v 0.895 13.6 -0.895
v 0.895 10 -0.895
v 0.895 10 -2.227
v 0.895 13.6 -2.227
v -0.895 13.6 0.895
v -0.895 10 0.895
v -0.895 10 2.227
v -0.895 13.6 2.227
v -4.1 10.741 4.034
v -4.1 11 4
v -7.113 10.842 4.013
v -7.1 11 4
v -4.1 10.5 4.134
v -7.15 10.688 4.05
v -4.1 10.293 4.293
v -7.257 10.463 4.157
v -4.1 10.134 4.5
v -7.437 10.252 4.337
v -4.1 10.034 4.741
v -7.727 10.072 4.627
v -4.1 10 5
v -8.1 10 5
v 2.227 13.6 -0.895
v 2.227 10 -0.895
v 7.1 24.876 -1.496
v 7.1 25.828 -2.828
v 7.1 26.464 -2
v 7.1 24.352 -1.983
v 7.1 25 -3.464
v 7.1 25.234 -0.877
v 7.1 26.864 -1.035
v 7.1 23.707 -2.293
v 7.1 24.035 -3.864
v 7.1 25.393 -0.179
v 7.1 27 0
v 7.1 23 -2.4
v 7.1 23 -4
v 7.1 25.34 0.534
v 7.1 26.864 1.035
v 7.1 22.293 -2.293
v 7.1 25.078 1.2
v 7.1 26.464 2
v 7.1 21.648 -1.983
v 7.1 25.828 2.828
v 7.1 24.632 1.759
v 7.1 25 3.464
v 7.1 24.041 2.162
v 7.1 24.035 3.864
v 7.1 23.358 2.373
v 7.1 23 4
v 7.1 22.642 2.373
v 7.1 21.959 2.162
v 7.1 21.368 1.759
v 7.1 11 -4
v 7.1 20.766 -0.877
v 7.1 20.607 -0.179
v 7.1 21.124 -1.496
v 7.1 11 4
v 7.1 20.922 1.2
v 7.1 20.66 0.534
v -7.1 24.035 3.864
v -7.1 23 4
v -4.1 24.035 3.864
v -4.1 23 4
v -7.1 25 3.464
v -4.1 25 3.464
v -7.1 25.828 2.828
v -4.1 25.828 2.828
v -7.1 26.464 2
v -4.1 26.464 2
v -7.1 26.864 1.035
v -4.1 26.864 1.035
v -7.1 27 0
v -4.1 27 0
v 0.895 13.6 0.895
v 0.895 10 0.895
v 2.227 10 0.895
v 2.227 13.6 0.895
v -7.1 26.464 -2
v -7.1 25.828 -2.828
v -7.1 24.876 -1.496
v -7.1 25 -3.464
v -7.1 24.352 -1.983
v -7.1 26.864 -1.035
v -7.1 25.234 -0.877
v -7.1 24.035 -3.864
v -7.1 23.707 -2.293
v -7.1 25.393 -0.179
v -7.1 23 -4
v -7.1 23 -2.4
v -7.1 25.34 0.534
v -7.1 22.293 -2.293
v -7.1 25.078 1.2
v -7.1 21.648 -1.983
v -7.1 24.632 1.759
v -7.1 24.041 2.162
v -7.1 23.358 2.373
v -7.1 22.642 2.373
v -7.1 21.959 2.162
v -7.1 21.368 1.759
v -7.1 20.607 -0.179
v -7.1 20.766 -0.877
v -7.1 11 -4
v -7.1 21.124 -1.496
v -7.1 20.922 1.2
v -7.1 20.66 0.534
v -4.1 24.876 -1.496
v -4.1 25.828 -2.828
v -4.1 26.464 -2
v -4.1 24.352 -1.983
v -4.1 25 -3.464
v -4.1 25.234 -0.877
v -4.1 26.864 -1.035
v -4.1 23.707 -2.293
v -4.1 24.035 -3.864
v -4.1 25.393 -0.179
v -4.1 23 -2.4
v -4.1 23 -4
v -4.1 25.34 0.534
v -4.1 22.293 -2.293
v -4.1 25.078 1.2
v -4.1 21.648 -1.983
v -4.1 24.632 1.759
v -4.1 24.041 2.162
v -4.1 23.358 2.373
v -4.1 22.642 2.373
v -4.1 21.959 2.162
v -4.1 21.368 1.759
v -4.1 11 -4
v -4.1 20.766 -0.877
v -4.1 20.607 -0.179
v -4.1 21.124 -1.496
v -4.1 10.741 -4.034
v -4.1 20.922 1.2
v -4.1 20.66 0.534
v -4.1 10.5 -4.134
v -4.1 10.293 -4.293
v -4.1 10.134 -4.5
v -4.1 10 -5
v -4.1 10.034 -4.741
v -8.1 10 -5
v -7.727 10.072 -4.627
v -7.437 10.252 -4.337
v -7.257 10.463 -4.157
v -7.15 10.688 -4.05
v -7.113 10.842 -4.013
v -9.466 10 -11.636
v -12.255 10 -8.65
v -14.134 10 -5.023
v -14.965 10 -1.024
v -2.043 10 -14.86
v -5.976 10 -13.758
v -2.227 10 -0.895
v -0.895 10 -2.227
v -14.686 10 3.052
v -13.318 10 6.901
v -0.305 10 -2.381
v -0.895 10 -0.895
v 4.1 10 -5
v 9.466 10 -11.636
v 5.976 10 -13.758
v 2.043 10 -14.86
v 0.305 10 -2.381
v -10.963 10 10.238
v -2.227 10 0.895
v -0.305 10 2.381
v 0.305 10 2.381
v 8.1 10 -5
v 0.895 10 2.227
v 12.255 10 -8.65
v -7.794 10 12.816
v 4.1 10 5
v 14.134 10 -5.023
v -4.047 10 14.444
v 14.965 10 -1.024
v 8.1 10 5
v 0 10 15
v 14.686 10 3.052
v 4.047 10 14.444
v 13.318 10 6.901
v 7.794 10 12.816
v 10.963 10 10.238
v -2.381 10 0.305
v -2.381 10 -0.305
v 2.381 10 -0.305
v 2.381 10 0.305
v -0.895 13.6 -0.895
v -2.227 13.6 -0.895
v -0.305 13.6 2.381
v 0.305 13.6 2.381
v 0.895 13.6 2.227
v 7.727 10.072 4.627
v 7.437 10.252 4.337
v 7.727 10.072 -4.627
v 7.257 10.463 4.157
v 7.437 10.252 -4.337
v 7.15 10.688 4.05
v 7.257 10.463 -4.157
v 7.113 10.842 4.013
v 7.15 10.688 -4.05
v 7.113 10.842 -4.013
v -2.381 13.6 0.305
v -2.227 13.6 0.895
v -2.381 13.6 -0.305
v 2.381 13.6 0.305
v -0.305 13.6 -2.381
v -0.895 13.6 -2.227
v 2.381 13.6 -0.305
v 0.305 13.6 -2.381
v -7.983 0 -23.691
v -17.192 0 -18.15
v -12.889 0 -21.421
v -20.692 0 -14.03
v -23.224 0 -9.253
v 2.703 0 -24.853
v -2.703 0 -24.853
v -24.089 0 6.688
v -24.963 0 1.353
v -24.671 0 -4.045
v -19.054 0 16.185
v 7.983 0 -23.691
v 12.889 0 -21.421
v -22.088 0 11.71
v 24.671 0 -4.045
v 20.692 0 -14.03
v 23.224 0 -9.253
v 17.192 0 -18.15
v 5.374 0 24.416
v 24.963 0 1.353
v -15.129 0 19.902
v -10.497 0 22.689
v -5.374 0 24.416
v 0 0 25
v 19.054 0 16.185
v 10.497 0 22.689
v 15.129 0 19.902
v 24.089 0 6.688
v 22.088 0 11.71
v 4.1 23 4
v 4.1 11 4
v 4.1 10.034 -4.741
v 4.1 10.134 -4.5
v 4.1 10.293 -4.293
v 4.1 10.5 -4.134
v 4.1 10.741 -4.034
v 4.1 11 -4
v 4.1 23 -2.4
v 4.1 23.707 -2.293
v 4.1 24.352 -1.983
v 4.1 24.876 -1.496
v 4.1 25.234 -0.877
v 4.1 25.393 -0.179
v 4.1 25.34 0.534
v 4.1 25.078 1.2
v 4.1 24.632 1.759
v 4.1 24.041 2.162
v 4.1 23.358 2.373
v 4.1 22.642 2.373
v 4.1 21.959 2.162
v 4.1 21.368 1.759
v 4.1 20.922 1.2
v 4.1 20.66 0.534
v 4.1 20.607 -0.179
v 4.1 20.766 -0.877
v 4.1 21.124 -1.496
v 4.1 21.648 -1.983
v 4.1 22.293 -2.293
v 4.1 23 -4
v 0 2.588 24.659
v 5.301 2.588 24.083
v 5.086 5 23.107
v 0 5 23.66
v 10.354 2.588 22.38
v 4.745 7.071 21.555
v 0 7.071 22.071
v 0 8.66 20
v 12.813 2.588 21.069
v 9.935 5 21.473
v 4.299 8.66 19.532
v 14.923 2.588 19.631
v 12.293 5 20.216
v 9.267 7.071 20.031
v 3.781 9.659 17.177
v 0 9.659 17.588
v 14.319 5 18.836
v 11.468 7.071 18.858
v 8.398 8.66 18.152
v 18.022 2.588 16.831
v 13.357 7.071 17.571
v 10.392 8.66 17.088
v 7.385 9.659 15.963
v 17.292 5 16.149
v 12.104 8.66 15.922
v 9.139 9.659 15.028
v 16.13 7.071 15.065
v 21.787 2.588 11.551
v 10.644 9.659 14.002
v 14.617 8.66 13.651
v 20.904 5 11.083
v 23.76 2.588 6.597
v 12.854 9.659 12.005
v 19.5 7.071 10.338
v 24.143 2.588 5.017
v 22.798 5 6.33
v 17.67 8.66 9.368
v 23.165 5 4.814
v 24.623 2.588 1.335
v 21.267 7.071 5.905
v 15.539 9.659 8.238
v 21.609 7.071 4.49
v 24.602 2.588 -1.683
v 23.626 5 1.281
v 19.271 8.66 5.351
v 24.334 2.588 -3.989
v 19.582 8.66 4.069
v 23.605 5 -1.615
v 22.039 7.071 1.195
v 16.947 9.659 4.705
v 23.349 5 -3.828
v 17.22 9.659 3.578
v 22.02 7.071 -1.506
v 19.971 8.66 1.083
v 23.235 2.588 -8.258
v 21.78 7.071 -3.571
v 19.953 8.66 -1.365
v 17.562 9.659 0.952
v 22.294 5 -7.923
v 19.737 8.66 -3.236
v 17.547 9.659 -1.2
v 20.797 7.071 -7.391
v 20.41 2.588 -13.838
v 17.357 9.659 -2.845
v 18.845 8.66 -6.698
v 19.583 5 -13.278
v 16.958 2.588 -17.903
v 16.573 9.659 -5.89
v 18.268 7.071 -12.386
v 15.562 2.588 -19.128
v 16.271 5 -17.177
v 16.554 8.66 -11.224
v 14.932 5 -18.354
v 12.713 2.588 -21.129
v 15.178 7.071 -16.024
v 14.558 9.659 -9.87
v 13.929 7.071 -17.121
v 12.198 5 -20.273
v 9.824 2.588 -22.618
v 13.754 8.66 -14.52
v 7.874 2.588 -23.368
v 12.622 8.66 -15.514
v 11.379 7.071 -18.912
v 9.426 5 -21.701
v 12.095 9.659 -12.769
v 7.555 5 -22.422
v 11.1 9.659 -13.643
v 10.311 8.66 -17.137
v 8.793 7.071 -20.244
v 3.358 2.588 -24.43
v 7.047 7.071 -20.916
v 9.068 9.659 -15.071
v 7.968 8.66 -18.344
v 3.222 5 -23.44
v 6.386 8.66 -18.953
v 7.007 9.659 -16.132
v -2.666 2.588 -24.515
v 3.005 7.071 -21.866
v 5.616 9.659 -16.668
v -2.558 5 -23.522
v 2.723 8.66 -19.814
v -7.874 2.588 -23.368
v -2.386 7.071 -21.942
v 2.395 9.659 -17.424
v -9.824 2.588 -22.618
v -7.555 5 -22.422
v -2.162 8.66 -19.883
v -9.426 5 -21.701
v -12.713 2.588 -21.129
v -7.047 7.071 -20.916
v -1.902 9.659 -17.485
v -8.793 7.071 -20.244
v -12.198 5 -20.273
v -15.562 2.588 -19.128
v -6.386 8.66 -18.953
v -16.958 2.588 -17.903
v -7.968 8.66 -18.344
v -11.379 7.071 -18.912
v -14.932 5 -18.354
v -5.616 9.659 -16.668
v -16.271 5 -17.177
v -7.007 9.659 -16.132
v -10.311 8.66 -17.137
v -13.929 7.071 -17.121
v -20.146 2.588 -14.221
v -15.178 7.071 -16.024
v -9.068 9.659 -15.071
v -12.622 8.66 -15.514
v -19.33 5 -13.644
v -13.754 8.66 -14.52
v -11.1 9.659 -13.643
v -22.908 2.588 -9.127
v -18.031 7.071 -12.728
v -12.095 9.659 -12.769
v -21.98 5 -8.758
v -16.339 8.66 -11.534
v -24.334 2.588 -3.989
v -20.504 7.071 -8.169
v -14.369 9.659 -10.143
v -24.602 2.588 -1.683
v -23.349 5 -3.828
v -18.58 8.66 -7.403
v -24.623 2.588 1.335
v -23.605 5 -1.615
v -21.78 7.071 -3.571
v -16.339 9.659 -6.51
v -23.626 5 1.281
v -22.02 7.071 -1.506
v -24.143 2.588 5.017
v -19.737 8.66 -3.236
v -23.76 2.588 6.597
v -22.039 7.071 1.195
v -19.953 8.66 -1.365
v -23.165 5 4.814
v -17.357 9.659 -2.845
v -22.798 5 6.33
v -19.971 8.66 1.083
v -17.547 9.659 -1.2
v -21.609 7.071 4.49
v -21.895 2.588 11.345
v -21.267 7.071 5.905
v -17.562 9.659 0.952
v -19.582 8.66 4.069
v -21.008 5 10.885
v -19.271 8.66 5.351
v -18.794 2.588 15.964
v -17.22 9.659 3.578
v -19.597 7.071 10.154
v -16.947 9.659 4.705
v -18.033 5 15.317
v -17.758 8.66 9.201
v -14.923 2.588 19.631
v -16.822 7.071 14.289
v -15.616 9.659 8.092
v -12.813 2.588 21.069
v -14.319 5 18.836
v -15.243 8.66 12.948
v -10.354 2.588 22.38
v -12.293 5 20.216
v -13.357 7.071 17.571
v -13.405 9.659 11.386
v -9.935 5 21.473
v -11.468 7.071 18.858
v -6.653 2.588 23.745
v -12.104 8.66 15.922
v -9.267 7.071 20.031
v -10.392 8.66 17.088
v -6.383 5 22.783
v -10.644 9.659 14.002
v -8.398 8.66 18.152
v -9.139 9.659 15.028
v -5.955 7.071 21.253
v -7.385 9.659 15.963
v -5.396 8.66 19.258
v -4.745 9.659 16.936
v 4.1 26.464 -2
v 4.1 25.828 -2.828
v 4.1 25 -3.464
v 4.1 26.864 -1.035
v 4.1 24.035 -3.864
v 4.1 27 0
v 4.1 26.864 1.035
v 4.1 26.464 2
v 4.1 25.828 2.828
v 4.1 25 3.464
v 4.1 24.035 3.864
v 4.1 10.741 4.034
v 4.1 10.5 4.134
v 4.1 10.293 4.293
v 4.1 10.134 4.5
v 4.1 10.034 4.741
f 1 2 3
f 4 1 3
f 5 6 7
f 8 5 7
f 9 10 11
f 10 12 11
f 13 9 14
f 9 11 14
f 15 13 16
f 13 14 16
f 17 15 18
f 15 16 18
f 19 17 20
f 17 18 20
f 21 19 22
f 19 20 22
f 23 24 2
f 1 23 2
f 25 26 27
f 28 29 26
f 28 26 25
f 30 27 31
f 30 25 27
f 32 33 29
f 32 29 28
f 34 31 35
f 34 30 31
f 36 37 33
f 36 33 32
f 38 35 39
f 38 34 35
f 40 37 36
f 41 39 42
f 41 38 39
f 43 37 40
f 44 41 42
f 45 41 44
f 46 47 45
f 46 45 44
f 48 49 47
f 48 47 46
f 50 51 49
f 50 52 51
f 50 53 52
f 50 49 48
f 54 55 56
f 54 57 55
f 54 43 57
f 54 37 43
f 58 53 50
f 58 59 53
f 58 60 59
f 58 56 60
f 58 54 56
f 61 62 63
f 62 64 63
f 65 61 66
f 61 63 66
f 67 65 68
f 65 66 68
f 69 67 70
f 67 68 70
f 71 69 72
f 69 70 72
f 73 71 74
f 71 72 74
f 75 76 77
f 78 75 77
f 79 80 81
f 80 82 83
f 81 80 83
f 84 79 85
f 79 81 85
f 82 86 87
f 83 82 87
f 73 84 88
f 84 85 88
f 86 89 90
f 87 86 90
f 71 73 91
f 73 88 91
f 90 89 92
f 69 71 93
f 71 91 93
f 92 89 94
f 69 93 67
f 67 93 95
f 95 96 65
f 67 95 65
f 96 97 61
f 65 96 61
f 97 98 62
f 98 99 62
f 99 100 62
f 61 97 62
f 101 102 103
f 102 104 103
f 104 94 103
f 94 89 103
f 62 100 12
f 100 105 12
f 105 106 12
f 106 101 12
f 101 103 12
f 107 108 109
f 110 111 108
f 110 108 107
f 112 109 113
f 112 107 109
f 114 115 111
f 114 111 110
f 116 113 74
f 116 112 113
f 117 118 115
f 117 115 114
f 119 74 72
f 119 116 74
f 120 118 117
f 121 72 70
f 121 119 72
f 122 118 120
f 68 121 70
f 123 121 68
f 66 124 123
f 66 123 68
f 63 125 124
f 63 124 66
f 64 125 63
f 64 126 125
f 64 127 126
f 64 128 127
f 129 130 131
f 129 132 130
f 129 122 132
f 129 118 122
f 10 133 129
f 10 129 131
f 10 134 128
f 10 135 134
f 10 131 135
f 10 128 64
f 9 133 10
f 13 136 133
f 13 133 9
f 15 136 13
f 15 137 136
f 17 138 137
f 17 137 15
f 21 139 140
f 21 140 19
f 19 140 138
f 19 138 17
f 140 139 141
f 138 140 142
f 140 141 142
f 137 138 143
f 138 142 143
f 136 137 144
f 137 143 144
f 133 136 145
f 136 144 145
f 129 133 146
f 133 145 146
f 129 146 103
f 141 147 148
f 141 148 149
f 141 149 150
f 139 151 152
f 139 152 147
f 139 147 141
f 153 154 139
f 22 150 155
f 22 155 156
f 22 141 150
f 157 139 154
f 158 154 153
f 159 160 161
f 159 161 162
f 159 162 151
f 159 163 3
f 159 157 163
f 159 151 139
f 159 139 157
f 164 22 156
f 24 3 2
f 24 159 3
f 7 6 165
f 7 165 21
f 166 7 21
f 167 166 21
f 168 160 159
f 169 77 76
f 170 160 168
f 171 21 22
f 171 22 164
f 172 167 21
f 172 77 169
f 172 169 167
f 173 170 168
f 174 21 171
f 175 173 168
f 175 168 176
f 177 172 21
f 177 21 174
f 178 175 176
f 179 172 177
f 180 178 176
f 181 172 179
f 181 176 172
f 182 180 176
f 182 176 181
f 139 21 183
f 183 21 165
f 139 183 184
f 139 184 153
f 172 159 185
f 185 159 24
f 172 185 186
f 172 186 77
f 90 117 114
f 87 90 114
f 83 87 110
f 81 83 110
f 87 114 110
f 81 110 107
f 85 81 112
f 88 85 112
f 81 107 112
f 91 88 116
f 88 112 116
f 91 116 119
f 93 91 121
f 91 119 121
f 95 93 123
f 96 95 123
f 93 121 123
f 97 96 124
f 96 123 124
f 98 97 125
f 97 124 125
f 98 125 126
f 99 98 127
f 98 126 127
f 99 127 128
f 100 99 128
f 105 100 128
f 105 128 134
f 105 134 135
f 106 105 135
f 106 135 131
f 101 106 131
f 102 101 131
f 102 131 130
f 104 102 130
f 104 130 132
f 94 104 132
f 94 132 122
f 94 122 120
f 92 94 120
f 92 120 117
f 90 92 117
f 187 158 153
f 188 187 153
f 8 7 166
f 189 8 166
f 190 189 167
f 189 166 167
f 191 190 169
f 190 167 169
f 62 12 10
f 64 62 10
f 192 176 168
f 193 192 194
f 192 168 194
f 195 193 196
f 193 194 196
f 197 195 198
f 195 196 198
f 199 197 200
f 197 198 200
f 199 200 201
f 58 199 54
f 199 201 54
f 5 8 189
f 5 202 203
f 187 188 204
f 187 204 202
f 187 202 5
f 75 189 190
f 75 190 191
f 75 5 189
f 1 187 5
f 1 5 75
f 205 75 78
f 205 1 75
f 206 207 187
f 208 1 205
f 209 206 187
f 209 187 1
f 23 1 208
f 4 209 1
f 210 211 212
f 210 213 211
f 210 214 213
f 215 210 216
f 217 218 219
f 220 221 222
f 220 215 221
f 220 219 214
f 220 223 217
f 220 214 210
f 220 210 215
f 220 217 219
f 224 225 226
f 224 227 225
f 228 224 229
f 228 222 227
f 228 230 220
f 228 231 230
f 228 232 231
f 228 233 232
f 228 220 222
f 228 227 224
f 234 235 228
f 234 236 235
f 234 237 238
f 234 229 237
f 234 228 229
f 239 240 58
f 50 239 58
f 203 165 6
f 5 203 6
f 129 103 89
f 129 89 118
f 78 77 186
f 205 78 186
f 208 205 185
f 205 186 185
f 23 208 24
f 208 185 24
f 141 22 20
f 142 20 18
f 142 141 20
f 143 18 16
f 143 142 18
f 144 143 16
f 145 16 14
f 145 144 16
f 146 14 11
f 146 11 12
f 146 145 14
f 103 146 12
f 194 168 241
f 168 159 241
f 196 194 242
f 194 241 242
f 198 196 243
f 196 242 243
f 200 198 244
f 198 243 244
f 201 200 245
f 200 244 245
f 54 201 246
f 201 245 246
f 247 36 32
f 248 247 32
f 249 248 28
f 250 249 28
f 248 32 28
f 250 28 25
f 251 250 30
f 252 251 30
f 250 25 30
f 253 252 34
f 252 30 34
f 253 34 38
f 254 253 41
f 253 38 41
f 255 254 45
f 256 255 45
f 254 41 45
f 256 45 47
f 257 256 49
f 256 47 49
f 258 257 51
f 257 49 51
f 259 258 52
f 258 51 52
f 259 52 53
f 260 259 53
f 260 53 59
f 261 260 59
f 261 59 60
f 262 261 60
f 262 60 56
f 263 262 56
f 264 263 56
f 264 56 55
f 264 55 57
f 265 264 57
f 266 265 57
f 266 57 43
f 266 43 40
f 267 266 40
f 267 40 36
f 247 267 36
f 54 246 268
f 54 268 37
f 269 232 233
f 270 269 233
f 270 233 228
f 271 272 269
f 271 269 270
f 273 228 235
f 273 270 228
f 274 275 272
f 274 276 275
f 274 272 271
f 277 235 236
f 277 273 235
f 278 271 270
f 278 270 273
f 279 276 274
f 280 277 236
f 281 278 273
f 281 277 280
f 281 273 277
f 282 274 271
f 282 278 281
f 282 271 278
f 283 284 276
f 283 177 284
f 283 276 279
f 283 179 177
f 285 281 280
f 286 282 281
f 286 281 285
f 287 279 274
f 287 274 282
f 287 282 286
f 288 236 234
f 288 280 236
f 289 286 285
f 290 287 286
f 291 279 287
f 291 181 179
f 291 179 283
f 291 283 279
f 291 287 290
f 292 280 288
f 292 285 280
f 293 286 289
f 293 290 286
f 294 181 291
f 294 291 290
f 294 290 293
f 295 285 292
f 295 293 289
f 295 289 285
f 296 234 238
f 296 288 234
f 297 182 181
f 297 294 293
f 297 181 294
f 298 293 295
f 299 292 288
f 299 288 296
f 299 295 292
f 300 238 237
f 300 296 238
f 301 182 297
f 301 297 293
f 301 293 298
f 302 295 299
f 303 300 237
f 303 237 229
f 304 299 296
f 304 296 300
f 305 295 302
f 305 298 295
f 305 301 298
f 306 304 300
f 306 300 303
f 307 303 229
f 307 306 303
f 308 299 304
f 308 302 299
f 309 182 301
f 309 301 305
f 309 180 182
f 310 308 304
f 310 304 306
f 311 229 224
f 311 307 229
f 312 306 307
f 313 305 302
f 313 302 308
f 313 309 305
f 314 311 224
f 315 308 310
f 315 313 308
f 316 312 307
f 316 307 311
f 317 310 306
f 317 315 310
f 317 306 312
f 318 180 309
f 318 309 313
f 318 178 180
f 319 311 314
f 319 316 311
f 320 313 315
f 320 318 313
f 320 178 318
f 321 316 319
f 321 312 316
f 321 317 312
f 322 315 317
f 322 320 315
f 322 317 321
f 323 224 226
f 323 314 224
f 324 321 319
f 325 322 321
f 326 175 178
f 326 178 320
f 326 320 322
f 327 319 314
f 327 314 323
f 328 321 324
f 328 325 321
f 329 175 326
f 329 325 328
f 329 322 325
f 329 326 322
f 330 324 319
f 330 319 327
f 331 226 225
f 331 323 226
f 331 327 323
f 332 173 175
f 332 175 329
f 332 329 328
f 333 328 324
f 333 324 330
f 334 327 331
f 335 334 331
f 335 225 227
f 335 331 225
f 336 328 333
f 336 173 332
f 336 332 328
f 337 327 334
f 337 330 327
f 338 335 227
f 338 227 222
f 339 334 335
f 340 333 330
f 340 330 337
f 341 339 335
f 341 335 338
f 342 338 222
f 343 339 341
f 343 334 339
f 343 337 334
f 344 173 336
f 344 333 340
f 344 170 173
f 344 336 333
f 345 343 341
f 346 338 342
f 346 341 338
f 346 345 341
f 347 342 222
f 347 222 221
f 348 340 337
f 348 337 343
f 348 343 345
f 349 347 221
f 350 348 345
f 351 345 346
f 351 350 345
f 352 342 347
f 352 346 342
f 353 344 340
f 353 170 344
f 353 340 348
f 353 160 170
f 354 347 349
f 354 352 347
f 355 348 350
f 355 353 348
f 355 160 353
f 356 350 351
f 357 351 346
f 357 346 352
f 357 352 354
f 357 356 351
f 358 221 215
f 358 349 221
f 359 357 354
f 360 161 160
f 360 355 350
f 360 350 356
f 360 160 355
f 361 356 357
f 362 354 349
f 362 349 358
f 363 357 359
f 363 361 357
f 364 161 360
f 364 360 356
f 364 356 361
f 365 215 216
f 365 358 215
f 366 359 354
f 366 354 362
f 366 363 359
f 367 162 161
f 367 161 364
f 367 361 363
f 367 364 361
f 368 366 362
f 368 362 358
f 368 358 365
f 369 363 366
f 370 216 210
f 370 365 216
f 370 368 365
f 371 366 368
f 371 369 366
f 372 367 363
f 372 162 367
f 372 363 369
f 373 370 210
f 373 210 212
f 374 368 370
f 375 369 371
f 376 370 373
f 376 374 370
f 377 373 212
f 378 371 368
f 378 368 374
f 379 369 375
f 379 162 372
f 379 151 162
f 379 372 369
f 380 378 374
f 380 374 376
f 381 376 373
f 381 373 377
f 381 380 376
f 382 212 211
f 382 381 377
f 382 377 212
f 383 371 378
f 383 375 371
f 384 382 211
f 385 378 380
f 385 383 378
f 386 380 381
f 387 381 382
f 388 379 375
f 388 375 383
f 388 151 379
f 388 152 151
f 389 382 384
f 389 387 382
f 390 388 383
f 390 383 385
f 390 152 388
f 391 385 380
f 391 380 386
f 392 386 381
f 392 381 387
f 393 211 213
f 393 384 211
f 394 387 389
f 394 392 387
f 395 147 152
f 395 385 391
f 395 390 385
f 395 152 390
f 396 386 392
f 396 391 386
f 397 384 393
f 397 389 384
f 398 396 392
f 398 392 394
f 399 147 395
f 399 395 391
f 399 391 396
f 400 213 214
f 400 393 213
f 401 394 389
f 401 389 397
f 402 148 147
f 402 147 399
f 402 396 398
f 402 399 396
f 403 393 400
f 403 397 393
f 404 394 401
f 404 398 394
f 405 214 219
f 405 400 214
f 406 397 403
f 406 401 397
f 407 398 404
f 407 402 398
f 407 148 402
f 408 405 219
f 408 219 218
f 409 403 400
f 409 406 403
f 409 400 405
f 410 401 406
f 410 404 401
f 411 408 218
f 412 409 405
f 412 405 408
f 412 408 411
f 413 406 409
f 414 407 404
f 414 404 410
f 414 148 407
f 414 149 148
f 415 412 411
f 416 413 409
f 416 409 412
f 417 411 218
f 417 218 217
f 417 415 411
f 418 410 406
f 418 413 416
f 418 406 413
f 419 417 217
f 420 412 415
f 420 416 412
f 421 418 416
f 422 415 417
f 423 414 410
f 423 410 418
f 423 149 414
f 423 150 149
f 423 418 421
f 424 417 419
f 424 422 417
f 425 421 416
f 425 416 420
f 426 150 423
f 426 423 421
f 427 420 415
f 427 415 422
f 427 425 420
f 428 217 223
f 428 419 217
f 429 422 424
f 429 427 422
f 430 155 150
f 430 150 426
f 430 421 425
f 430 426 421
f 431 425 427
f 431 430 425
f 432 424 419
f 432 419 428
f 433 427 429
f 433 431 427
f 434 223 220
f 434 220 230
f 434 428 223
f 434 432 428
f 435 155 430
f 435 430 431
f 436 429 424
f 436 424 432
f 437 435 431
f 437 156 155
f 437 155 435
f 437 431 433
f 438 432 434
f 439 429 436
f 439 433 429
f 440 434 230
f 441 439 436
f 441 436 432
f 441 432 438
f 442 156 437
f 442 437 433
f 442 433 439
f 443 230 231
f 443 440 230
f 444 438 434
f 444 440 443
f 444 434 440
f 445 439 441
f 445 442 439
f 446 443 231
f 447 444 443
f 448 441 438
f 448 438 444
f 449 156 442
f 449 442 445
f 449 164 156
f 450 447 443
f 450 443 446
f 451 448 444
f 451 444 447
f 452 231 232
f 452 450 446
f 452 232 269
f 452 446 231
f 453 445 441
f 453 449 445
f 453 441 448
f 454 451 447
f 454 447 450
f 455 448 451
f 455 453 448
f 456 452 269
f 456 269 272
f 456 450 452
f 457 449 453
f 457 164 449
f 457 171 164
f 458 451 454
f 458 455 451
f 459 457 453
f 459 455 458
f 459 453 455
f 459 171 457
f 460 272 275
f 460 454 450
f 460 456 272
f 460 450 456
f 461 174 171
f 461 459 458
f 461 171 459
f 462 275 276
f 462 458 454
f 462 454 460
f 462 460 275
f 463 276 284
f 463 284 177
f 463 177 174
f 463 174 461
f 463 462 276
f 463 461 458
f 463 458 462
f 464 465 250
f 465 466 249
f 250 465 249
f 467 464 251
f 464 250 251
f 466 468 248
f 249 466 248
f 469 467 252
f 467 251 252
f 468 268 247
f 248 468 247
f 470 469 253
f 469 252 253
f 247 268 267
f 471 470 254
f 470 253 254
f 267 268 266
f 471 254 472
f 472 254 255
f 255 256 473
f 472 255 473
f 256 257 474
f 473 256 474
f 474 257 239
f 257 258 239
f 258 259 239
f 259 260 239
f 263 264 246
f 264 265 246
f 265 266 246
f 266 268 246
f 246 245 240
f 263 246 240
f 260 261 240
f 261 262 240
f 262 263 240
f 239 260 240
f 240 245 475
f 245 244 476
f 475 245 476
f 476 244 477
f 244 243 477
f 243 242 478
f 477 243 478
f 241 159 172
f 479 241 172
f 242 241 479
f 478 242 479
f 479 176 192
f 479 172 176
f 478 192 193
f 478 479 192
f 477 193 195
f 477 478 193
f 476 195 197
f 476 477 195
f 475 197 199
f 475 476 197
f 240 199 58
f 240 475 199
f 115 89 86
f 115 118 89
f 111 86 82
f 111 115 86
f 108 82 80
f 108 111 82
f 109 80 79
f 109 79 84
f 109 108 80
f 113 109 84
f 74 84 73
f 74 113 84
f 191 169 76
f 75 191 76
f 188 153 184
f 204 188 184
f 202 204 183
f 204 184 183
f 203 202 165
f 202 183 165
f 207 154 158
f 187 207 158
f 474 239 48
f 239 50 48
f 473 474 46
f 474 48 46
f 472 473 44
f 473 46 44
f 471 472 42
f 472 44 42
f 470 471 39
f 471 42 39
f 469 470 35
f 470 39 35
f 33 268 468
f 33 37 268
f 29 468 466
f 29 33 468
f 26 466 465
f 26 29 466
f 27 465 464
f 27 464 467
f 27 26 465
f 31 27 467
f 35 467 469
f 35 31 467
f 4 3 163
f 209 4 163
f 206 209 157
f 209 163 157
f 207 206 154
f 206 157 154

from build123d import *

# Parameters (mm, degrees)
SKETCH1_R           = 25
BOSS_EXTRUDE1_DEPTH = 10
FILLET1_R           = 10
BOSS_EXTRUDE2_DEPTH = 3.6
SKETCH3_W           = 3
SKETCH3_H           = 8
BOSS_EXTRUDE3_DEPTH = 27
SKETCH4_R           = 2.4
CUT_EXTRUDE1_DEPTH  = 49.830420846
FILLET2_R           = 4
FILLET3_R           = 1


with BuildPart() as part:
    # Sketch1 → Boss-Extrude1 (new body)
    with BuildSketch(Plane(origin=(0, 0, 0), x_dir=(1, 0, 0), z_dir=(0, 1, 0))):
        with Locations(Location((0, 0, 0), (0, 0, 270))):
            Circle(SKETCH1_R)
    extrude(amount=BOSS_EXTRUDE1_DEPTH)

    # Fillet1
    fillet1_edges = [part.edges().sort_by_distance(p)[0] for p in [
        (0, 10, -25),
    ]]
    fillet(fillet1_edges, radius=FILLET1_R - 0.0001)  # a hair under: the kernel refuses the full size

    # Sketch2 → Boss-Extrude2 (add)
    with BuildSketch(Plane(origin=(0, 10, 0), x_dir=(1, 0, 0), z_dir=(0, 1, 0))):
        with BuildLine():
            Line((-2.226875614, -0.895), (-0.895, -0.895))
            Line((-0.895, -0.895), (-0.895, -2.226875614))
            ThreePointArc((-0.895, -2.226875614), (0, -2.4), (0.895, -2.226875614))
            Line((0.895, -2.226875614), (0.895, -0.895))
            Line((0.895, -0.895), (2.226875614, -0.895))
            ThreePointArc((2.226875614, -0.895), (2.4, 0), (2.226875614, 0.895))
            Line((2.226875614, 0.895), (0.895, 0.895))
            Line((0.895, 0.895), (0.895, 2.226875614))
            ThreePointArc((0.895, 2.226875614), (0, 2.4), (-0.895, 2.226875614))
            Line((-0.895, 2.226875614), (-0.895, 0.895))
            Line((-0.895, 0.895), (-2.226875614, 0.895))
            ThreePointArc((-2.226875614, 0.895), (-2.4, 0), (-2.226875614, -0.895))
        make_face()
    extrude(amount=BOSS_EXTRUDE2_DEPTH)

    # Sketch3 → Boss-Extrude3 (add)
    with BuildSketch(Plane.XZ):
        with Locations((-5.6, 0)):
            Rectangle(SKETCH3_W, SKETCH3_H)
        with Locations((5.6, 0)):
            Rectangle(SKETCH3_W, SKETCH3_H)
    extrude(amount=-BOSS_EXTRUDE3_DEPTH)

    # Sketch4 → Cut-Extrude1 (cut, through all)
    with BuildSketch(Plane(origin=(7.1, 0, 0), x_dir=(0, 0, -1), z_dir=(1, 0, 0))):
        with Locations((0, 23)):
            Circle(SKETCH4_R)
    extrude(amount=-CUT_EXTRUDE1_DEPTH, mode=Mode.SUBTRACT)

    # Fillet2
    fillet2_edges = [part.edges().sort_by_distance(p)[0] for p in [
        (5.6, 27, -4),
        (5.6, 27, 4),
        (-5.6, 27, 4),
        (-5.6, 27, -4),
    ]]
    fillet(fillet2_edges, radius=FILLET2_R - 0.0001)  # a hair under: the kernel refuses the full size

    # Fillet3
    fillet3_edges = [part.edges().sort_by_distance(p)[0] for p in [
        (-7.1, 10, 0),
        (-5.6, 10, 4),
        (-5.6, 10, -4),
        (5.6, 10, 4),
        (7.1, 10, 0),
        (5.6, 10, -4),
    ]]
    fillet(fillet3_edges, radius=FILLET3_R)


solid = part.part
